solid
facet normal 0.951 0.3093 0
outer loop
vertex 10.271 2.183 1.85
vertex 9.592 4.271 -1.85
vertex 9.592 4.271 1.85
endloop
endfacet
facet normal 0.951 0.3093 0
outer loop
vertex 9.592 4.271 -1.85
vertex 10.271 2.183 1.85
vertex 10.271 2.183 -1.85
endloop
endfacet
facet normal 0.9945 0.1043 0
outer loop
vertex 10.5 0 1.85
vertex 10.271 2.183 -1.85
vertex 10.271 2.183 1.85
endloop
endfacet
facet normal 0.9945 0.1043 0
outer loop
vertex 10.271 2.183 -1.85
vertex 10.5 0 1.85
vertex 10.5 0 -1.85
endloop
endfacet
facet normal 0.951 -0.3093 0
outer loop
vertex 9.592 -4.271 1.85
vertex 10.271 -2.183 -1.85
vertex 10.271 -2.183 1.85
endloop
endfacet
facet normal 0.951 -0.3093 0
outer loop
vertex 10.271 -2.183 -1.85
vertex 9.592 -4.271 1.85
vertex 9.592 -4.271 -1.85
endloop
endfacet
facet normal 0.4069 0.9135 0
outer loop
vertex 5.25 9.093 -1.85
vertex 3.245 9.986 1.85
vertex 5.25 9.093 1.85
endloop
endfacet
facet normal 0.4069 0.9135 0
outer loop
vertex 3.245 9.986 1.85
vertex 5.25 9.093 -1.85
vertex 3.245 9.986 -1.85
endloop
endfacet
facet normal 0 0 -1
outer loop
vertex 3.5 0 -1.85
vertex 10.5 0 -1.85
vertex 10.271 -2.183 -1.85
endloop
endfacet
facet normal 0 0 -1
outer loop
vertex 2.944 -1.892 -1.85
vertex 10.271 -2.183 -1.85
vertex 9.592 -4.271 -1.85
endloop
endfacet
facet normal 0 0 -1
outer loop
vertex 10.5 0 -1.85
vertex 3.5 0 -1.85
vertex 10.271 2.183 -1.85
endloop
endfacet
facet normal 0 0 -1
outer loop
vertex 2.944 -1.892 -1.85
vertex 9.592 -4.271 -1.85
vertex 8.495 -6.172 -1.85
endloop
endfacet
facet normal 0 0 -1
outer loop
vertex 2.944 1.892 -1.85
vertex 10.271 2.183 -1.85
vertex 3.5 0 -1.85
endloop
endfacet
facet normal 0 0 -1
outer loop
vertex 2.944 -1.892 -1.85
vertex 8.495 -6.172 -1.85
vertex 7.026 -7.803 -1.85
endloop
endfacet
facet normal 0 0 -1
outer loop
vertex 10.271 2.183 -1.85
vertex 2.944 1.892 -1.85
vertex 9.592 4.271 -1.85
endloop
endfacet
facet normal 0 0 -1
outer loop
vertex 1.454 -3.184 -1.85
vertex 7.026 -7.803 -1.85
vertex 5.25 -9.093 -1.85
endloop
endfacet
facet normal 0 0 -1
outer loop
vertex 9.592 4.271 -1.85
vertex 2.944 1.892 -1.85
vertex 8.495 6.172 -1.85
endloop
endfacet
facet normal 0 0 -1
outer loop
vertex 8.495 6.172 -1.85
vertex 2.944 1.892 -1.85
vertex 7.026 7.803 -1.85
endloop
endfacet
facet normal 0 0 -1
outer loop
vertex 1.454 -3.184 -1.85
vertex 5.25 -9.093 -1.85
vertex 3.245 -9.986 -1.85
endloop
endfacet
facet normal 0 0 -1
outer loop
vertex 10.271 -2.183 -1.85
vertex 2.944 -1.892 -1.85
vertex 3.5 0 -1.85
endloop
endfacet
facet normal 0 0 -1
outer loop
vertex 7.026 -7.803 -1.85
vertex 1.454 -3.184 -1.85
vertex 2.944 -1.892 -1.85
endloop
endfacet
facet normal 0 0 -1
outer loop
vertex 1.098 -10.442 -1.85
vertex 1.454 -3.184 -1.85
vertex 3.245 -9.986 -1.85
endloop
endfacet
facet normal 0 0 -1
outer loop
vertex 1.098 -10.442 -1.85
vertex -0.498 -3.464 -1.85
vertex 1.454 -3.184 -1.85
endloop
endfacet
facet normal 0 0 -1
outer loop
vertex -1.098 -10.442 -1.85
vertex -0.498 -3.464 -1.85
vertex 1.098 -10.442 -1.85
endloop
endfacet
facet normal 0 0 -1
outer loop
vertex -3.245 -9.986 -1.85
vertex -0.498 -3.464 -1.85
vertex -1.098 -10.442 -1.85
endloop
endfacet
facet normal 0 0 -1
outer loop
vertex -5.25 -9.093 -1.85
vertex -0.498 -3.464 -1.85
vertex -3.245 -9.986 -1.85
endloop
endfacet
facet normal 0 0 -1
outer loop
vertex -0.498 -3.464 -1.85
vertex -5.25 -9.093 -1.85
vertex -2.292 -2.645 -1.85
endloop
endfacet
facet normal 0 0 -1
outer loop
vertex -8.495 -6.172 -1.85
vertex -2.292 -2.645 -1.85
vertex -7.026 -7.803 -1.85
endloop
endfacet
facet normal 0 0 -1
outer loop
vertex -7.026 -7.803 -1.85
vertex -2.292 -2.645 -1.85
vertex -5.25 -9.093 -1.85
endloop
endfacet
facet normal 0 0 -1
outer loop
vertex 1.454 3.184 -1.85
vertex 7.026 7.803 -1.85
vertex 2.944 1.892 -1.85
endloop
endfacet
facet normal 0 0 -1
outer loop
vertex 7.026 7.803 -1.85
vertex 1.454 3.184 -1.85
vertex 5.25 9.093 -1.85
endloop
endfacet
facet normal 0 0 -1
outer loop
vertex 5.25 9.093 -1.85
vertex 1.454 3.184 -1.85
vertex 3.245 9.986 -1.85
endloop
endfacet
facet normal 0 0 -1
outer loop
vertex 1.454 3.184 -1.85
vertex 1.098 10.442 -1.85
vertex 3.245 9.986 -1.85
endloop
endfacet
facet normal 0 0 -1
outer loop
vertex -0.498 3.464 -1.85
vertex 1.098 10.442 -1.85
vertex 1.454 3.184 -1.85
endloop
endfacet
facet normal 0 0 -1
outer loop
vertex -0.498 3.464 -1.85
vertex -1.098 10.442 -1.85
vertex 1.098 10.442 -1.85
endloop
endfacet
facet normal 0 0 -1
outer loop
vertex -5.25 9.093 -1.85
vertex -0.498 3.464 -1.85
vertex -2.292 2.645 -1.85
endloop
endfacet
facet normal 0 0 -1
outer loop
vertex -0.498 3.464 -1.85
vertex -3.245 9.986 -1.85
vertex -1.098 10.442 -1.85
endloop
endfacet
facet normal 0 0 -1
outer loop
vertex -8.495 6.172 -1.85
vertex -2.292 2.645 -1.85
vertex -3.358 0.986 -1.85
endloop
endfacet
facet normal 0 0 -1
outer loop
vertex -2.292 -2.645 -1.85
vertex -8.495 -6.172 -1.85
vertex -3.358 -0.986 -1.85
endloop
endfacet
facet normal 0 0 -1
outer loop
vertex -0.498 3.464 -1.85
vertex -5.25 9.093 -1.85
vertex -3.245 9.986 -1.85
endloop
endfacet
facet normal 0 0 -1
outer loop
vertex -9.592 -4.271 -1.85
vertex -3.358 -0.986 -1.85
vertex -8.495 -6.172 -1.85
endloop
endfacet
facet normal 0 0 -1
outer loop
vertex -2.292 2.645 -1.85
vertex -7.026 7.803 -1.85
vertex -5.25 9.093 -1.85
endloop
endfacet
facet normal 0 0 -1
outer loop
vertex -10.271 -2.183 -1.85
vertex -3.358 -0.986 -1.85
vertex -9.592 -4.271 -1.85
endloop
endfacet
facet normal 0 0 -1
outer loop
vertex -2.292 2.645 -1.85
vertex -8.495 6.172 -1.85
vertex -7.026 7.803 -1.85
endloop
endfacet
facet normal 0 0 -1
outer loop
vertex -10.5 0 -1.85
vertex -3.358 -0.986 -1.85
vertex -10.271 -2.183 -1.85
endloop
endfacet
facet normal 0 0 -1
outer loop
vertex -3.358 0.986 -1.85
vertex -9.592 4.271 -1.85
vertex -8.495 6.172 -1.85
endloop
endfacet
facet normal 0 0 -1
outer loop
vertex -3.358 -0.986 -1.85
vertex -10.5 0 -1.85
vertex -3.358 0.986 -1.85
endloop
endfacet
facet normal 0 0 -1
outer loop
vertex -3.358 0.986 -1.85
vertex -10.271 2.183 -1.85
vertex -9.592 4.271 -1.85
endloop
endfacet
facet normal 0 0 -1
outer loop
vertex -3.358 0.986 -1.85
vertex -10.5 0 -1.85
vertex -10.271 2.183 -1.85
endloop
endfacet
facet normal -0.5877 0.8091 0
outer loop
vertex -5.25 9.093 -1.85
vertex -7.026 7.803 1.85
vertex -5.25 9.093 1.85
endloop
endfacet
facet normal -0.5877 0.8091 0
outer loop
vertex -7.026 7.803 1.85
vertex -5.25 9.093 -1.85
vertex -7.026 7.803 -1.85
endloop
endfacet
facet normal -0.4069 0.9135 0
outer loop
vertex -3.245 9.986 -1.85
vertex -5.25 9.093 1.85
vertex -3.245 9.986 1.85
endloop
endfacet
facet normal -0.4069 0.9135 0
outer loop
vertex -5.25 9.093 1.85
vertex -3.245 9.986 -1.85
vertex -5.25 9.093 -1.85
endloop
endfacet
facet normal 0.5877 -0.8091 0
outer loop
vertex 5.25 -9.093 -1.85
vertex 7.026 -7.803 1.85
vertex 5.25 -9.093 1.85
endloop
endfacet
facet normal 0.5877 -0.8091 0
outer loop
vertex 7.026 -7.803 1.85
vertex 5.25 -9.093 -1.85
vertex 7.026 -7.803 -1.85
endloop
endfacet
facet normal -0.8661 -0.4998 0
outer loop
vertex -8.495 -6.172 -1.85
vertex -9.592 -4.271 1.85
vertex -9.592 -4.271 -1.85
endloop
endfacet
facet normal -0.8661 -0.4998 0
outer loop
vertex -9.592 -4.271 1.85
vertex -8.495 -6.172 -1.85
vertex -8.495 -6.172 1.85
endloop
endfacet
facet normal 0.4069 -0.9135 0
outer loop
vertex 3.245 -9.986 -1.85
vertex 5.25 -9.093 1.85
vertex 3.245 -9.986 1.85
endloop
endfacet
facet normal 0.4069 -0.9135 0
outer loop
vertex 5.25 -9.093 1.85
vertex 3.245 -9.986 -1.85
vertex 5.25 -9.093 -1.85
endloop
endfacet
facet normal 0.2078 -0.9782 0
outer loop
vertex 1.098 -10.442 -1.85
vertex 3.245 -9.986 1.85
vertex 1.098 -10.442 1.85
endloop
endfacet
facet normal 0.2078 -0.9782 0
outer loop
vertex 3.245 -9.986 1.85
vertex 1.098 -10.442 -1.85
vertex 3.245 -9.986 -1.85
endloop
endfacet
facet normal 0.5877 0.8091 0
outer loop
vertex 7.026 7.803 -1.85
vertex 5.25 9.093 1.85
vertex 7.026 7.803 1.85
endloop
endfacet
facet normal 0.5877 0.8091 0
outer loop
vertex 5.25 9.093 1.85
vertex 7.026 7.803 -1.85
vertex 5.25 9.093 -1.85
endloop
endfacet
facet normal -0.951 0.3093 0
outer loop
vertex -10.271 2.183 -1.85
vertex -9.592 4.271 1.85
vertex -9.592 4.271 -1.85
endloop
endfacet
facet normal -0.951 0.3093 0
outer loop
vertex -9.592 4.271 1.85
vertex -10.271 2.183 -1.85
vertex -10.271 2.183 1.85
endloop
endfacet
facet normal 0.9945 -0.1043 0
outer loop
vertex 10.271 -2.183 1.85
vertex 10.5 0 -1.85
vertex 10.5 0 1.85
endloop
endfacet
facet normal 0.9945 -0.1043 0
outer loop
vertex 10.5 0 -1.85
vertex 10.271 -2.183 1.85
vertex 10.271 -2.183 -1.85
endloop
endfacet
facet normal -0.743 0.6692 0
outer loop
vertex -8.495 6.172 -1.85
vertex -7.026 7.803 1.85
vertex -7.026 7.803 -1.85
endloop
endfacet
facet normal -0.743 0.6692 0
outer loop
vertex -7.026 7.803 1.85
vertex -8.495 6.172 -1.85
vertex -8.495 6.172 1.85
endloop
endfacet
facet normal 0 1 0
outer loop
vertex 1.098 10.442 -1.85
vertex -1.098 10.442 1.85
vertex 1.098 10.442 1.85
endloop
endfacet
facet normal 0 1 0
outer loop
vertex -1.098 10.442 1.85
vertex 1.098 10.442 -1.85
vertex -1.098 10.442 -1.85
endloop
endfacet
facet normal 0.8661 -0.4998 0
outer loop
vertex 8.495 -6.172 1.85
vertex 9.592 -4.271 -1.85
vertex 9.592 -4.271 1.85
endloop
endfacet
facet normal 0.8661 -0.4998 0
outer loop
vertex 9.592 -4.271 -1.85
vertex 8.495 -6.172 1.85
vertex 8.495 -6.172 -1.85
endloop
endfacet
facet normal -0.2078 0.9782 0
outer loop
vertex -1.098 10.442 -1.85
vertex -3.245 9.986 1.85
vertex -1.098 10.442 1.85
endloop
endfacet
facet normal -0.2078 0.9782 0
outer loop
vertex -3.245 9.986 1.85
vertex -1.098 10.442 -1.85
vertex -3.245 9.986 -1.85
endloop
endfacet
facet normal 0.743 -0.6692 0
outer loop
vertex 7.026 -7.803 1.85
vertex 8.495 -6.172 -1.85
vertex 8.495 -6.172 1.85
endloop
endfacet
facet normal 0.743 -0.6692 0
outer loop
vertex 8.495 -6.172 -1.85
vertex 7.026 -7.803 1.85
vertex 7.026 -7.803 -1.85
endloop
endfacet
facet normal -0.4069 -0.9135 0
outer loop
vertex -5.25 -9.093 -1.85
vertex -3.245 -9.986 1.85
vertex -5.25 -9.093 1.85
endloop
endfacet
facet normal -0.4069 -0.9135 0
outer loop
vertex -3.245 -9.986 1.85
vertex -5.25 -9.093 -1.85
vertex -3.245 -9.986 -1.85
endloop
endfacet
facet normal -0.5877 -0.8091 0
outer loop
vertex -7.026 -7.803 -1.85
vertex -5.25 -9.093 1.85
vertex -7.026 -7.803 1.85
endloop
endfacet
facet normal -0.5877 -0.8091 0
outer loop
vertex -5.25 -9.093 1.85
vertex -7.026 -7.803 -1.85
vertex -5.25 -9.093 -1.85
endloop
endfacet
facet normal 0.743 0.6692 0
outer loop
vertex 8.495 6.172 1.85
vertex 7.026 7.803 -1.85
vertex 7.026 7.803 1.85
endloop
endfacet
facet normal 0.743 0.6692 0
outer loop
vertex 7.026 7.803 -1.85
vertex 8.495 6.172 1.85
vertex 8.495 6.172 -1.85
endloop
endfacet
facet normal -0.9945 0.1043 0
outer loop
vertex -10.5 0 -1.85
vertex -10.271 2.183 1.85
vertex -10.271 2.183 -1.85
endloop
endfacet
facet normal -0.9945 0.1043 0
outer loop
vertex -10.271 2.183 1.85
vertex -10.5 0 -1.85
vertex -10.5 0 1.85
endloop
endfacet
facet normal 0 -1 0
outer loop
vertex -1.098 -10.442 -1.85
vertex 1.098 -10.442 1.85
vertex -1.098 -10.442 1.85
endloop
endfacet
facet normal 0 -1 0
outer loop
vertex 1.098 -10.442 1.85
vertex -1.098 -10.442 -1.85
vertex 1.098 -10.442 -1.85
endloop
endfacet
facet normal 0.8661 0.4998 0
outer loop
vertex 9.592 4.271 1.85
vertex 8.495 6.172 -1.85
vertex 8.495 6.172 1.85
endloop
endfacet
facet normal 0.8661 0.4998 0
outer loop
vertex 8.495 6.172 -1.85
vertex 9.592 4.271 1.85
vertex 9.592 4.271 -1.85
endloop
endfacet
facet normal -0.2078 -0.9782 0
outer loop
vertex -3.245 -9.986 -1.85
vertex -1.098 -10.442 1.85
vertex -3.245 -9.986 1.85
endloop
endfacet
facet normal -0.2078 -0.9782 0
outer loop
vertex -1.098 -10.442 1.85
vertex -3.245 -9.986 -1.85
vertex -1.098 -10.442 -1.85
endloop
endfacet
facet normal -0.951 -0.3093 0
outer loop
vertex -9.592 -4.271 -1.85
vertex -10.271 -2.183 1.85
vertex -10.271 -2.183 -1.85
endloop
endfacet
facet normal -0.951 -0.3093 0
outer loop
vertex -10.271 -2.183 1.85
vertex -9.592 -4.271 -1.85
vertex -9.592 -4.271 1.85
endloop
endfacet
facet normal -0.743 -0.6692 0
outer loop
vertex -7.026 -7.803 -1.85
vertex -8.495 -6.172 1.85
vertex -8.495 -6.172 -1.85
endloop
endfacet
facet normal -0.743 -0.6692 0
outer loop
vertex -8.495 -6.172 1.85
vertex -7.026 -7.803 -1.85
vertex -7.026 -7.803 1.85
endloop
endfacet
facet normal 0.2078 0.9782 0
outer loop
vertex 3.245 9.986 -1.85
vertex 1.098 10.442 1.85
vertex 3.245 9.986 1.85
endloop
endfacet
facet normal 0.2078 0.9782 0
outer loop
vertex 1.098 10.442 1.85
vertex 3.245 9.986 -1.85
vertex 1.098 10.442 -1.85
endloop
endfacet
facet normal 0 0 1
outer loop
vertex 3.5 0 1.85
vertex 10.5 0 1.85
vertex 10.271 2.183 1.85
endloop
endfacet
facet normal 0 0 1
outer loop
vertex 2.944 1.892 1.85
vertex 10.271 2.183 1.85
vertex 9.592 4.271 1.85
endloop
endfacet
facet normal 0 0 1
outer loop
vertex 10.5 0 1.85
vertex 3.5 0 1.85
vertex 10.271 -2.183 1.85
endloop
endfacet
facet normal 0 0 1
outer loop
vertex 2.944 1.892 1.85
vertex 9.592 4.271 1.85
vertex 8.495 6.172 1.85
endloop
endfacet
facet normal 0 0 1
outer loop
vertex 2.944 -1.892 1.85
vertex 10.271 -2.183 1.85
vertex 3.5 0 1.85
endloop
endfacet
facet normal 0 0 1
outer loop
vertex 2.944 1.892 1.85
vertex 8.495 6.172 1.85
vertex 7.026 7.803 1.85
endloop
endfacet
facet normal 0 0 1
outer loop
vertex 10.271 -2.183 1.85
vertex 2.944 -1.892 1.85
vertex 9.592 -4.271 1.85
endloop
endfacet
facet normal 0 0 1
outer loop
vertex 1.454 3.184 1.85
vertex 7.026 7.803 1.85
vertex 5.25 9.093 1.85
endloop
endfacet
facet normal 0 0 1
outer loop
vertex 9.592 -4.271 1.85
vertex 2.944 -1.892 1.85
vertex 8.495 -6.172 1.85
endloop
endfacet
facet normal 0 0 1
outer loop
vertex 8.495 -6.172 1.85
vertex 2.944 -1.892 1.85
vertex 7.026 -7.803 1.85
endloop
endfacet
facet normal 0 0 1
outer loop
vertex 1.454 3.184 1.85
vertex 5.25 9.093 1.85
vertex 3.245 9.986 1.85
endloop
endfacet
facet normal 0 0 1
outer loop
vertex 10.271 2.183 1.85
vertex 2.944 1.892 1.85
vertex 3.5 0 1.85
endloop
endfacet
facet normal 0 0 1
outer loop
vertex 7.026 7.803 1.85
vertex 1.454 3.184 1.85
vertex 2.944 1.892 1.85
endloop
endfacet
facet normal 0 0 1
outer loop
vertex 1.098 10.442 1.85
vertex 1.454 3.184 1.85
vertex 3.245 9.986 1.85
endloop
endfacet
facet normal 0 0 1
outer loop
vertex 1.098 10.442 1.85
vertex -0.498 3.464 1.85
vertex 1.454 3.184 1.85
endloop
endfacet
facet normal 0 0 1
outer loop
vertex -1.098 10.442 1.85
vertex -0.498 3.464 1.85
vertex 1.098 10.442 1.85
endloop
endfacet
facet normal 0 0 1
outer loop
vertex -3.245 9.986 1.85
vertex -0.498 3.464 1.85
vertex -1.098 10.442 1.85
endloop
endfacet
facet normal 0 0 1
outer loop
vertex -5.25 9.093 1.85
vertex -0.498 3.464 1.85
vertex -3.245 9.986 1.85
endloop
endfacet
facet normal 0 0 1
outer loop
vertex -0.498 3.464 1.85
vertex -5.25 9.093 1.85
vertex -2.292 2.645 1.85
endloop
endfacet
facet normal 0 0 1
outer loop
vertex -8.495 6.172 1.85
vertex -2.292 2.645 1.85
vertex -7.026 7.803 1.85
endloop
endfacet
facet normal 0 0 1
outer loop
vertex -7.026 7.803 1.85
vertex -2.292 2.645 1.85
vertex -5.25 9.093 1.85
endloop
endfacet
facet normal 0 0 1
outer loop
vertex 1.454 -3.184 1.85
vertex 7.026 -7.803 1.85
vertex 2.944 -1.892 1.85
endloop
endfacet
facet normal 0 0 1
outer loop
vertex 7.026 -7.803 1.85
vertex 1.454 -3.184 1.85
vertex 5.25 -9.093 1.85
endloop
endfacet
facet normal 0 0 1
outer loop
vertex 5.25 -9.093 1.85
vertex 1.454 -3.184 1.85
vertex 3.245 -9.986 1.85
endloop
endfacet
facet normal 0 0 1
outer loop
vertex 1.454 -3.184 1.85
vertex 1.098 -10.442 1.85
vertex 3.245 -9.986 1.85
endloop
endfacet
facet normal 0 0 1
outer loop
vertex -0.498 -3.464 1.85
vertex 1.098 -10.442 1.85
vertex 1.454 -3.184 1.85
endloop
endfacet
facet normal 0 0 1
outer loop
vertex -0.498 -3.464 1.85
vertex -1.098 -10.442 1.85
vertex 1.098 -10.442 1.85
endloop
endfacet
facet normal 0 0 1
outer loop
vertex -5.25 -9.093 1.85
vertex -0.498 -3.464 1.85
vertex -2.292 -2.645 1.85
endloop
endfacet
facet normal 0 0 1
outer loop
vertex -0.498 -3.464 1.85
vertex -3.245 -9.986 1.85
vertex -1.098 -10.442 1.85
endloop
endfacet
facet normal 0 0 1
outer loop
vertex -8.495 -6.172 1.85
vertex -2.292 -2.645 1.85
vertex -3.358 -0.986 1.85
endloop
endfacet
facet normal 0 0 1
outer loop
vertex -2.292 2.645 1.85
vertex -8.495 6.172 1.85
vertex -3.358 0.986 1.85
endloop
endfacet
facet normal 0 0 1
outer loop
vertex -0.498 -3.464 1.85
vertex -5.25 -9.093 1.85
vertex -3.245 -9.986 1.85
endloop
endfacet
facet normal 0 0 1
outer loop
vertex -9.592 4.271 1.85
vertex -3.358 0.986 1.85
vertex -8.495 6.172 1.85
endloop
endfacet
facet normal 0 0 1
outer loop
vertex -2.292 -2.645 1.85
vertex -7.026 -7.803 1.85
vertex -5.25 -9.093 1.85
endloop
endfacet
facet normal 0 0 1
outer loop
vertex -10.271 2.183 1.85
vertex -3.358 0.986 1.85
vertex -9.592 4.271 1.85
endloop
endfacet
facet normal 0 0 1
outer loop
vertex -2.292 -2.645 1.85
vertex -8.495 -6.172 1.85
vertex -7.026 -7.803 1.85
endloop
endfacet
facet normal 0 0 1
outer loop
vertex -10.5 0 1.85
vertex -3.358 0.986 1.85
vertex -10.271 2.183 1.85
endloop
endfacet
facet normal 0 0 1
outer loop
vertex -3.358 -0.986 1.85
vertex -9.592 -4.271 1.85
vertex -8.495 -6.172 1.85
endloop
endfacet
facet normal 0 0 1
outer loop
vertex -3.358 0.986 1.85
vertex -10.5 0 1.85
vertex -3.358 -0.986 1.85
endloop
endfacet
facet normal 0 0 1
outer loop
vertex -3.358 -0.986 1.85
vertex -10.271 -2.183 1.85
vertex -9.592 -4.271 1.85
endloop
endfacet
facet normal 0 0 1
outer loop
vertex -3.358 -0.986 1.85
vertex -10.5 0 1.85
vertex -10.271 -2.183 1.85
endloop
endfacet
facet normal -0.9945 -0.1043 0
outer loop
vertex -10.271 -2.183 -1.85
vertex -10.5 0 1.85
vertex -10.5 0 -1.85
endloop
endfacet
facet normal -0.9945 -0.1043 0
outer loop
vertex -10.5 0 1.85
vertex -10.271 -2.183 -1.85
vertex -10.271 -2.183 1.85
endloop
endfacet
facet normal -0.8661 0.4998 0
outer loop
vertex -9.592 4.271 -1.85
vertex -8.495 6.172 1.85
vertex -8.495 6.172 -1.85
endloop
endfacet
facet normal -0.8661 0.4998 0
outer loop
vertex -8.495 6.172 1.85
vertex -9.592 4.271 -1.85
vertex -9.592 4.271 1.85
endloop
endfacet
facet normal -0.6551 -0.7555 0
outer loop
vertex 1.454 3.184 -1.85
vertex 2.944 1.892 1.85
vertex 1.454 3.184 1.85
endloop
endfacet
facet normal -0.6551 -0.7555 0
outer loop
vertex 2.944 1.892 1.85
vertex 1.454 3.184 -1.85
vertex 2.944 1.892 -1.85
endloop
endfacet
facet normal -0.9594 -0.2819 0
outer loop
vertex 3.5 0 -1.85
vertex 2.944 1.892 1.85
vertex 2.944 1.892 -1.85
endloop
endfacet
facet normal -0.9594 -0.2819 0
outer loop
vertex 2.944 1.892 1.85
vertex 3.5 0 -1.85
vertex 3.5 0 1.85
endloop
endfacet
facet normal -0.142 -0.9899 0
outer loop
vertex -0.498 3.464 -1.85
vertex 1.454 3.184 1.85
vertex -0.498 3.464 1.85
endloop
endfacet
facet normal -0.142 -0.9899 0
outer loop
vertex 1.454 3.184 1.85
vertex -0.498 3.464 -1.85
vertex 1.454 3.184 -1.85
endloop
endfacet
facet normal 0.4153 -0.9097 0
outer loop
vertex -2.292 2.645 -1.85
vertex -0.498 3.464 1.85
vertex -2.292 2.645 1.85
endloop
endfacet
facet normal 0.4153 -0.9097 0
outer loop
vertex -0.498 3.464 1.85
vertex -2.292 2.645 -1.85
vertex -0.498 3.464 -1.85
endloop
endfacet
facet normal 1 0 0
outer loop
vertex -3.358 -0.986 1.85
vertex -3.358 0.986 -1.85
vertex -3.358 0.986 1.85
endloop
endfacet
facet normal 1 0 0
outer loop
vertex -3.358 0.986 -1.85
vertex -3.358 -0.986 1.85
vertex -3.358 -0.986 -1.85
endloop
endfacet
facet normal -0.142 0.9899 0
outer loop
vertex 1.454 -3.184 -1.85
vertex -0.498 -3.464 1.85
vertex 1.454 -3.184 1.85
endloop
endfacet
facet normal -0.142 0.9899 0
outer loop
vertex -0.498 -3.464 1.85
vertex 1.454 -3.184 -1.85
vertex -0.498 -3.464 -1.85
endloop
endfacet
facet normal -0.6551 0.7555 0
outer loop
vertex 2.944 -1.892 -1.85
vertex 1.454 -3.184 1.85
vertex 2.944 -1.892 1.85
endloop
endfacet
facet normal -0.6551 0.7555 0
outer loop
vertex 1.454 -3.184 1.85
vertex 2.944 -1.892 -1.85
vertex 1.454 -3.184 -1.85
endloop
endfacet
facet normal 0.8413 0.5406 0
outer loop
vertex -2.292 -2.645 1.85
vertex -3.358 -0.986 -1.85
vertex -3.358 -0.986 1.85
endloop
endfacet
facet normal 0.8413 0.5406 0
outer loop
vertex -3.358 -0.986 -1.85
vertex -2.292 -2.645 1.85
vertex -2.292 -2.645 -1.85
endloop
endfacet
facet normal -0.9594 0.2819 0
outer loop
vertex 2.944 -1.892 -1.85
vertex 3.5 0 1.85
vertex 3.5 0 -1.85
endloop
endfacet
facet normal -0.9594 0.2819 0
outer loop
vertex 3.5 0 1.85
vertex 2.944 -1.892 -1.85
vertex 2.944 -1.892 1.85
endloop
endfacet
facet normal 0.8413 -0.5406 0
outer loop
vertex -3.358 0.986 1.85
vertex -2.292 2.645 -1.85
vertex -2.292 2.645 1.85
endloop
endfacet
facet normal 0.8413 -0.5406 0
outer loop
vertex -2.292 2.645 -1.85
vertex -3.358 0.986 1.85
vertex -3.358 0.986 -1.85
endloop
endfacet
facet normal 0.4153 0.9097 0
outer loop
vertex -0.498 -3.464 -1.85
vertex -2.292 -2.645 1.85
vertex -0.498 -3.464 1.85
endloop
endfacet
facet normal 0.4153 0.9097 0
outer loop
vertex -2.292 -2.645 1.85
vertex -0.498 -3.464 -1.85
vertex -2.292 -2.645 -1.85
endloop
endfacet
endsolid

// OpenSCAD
// Parameters
outer_radius = 10.5; //[5.25:21:0.1]
inner_radius = 3.5; //[1.75:7:0.1]
height = 3.7; //[1.85:7.4:0.1]

// Geometry
module radial_body_outer() {
  cylinder(h=height, r=outer_radius, center=true);
}

module radial_body_inner_cut() {
  cylinder(h=height, r=inner_radius, center=true);
}

// Final Output
difference() {
  radial_body_outer();
  radial_body_inner_cut();
}
